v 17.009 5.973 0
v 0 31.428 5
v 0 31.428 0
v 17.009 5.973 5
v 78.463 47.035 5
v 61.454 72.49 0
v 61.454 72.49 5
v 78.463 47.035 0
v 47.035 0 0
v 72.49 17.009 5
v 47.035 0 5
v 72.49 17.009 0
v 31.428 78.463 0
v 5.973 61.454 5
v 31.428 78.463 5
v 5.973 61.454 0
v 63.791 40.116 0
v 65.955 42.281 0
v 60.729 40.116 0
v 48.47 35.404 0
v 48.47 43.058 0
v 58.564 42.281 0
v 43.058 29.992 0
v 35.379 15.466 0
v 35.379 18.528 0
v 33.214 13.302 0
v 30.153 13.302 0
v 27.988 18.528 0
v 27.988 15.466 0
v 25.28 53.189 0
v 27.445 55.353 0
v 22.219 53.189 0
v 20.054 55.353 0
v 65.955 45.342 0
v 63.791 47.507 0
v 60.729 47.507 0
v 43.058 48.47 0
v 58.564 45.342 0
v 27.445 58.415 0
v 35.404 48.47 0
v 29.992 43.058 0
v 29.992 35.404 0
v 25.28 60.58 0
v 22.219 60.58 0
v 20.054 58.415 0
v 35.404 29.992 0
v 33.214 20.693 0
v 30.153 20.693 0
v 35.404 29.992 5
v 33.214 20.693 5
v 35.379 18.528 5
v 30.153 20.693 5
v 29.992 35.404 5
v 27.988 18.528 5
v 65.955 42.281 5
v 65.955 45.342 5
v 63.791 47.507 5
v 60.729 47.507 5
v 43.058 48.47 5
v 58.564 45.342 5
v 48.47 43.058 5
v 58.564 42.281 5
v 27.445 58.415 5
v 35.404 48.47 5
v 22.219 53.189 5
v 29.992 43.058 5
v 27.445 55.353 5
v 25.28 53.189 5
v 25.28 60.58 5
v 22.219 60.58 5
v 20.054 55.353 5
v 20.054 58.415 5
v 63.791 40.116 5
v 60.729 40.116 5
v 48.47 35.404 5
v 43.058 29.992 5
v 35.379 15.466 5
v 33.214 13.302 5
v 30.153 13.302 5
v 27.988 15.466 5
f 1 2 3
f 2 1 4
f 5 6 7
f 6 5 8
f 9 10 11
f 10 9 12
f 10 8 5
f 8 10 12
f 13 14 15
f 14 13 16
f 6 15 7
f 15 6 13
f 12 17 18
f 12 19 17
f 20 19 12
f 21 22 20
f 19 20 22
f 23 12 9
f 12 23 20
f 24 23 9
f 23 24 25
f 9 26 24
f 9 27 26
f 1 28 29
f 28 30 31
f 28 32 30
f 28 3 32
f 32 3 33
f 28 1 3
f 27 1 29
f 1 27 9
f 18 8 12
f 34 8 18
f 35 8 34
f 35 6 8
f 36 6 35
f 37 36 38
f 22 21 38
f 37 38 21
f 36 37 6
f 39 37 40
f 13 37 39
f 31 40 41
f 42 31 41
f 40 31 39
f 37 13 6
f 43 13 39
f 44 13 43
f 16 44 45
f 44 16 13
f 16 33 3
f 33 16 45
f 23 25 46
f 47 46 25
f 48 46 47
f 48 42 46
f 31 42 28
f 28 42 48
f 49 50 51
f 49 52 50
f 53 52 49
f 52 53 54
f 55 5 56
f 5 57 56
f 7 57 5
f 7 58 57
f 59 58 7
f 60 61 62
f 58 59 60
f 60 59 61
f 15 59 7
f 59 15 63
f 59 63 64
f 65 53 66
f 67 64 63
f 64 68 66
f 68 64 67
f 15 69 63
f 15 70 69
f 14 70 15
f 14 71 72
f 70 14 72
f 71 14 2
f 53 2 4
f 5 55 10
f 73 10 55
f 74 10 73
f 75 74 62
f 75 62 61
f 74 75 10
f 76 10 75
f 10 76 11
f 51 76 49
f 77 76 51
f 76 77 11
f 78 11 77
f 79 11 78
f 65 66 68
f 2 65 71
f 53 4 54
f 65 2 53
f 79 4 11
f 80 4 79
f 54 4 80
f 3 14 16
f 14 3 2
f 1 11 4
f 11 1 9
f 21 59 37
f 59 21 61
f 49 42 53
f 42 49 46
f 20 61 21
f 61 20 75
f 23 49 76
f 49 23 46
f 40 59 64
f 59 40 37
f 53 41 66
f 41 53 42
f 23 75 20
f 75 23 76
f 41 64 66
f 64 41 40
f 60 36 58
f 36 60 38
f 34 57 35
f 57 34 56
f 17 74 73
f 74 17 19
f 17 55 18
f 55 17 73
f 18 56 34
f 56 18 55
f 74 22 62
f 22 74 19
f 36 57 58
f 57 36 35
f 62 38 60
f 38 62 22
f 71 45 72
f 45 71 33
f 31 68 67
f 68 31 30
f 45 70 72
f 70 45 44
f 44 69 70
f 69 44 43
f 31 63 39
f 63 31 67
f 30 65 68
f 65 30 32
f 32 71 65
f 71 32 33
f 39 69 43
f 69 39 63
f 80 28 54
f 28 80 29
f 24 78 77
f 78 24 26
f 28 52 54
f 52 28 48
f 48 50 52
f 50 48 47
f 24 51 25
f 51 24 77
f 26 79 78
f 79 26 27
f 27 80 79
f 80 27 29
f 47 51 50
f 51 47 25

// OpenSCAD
$fn = 32;

// ----------------------------------------------------------------------
// Polygon plate: 8-gon R40, 3 bolt windows
// ----------------------------------------------------------------------

// --- parameters (mm) ---
sides = 8;                // number of polygon sides
plate_r = 40;             // circumscribed radius of the polygon
bore_r = 10;              // centre bore radius
bolts = 3;                // number of bolt windows
ring_r = 23.48;           // bolt-circle radius
bolt_r = 4;               // bolt window radius
plate_t = 5;              // plate thickness, Z (extrusion height)

plate_d = 2 * plate_r;  // circumscribed diameter
bore_d = 2 * bore_r;  // centre bore diameter
bolt_d = 2 * bolt_r;  // bolt window diameter
ring_d = 2 * ring_r;  // bolt-circle diameter

profile = [[78.463, 47.035], [61.454, 72.49], [31.428, 78.463], [5.973, 61.454], [0, 31.428], [17.009, 5.973], [47.035, 0], [72.49, 17.009]];  // primary outline, 8 points, counter clockwise
void_1 = [[48.47, 43.058], [43.058, 48.47], [35.404, 48.47], [29.992, 43.058], [29.992, 35.404], [35.404, 29.992], [43.058, 29.992], [48.47, 35.404]];  // centre bore, 8 points
void_2 = [[65.955, 45.342], [63.791, 47.507], [60.729, 47.507], [58.564, 45.342], [58.564, 42.281], [60.729, 40.116], [63.791, 40.116], [65.955, 42.281]];  // bolt window 1, 8 points
void_3 = [[27.445, 58.415], [25.28, 60.58], [22.219, 60.58], [20.054, 58.415], [20.054, 55.353], [22.219, 53.189], [25.28, 53.189], [27.445, 55.353]];  // bolt window 2, 8 points
void_4 = [[35.379, 18.528], [33.214, 20.693], [30.153, 20.693], [27.988, 18.528], [27.988, 15.466], [30.153, 13.302], [33.214, 13.302], [35.379, 15.466]];  // bolt window 3, 8 points

// --- the one profile operation ---
difference() {
  linear_extrude(height = plate_t) polygon(points = profile);
  translate([0, 0, -1])
    linear_extrude(height = plate_t + 2) polygon(points = void_1);
  translate([0, 0, -1])
    linear_extrude(height = plate_t + 2) polygon(points = void_2);
  translate([0, 0, -1])
    linear_extrude(height = plate_t + 2) polygon(points = void_3);
  translate([0, 0, -1])
    linear_extrude(height = plate_t + 2) polygon(points = void_4);
}
